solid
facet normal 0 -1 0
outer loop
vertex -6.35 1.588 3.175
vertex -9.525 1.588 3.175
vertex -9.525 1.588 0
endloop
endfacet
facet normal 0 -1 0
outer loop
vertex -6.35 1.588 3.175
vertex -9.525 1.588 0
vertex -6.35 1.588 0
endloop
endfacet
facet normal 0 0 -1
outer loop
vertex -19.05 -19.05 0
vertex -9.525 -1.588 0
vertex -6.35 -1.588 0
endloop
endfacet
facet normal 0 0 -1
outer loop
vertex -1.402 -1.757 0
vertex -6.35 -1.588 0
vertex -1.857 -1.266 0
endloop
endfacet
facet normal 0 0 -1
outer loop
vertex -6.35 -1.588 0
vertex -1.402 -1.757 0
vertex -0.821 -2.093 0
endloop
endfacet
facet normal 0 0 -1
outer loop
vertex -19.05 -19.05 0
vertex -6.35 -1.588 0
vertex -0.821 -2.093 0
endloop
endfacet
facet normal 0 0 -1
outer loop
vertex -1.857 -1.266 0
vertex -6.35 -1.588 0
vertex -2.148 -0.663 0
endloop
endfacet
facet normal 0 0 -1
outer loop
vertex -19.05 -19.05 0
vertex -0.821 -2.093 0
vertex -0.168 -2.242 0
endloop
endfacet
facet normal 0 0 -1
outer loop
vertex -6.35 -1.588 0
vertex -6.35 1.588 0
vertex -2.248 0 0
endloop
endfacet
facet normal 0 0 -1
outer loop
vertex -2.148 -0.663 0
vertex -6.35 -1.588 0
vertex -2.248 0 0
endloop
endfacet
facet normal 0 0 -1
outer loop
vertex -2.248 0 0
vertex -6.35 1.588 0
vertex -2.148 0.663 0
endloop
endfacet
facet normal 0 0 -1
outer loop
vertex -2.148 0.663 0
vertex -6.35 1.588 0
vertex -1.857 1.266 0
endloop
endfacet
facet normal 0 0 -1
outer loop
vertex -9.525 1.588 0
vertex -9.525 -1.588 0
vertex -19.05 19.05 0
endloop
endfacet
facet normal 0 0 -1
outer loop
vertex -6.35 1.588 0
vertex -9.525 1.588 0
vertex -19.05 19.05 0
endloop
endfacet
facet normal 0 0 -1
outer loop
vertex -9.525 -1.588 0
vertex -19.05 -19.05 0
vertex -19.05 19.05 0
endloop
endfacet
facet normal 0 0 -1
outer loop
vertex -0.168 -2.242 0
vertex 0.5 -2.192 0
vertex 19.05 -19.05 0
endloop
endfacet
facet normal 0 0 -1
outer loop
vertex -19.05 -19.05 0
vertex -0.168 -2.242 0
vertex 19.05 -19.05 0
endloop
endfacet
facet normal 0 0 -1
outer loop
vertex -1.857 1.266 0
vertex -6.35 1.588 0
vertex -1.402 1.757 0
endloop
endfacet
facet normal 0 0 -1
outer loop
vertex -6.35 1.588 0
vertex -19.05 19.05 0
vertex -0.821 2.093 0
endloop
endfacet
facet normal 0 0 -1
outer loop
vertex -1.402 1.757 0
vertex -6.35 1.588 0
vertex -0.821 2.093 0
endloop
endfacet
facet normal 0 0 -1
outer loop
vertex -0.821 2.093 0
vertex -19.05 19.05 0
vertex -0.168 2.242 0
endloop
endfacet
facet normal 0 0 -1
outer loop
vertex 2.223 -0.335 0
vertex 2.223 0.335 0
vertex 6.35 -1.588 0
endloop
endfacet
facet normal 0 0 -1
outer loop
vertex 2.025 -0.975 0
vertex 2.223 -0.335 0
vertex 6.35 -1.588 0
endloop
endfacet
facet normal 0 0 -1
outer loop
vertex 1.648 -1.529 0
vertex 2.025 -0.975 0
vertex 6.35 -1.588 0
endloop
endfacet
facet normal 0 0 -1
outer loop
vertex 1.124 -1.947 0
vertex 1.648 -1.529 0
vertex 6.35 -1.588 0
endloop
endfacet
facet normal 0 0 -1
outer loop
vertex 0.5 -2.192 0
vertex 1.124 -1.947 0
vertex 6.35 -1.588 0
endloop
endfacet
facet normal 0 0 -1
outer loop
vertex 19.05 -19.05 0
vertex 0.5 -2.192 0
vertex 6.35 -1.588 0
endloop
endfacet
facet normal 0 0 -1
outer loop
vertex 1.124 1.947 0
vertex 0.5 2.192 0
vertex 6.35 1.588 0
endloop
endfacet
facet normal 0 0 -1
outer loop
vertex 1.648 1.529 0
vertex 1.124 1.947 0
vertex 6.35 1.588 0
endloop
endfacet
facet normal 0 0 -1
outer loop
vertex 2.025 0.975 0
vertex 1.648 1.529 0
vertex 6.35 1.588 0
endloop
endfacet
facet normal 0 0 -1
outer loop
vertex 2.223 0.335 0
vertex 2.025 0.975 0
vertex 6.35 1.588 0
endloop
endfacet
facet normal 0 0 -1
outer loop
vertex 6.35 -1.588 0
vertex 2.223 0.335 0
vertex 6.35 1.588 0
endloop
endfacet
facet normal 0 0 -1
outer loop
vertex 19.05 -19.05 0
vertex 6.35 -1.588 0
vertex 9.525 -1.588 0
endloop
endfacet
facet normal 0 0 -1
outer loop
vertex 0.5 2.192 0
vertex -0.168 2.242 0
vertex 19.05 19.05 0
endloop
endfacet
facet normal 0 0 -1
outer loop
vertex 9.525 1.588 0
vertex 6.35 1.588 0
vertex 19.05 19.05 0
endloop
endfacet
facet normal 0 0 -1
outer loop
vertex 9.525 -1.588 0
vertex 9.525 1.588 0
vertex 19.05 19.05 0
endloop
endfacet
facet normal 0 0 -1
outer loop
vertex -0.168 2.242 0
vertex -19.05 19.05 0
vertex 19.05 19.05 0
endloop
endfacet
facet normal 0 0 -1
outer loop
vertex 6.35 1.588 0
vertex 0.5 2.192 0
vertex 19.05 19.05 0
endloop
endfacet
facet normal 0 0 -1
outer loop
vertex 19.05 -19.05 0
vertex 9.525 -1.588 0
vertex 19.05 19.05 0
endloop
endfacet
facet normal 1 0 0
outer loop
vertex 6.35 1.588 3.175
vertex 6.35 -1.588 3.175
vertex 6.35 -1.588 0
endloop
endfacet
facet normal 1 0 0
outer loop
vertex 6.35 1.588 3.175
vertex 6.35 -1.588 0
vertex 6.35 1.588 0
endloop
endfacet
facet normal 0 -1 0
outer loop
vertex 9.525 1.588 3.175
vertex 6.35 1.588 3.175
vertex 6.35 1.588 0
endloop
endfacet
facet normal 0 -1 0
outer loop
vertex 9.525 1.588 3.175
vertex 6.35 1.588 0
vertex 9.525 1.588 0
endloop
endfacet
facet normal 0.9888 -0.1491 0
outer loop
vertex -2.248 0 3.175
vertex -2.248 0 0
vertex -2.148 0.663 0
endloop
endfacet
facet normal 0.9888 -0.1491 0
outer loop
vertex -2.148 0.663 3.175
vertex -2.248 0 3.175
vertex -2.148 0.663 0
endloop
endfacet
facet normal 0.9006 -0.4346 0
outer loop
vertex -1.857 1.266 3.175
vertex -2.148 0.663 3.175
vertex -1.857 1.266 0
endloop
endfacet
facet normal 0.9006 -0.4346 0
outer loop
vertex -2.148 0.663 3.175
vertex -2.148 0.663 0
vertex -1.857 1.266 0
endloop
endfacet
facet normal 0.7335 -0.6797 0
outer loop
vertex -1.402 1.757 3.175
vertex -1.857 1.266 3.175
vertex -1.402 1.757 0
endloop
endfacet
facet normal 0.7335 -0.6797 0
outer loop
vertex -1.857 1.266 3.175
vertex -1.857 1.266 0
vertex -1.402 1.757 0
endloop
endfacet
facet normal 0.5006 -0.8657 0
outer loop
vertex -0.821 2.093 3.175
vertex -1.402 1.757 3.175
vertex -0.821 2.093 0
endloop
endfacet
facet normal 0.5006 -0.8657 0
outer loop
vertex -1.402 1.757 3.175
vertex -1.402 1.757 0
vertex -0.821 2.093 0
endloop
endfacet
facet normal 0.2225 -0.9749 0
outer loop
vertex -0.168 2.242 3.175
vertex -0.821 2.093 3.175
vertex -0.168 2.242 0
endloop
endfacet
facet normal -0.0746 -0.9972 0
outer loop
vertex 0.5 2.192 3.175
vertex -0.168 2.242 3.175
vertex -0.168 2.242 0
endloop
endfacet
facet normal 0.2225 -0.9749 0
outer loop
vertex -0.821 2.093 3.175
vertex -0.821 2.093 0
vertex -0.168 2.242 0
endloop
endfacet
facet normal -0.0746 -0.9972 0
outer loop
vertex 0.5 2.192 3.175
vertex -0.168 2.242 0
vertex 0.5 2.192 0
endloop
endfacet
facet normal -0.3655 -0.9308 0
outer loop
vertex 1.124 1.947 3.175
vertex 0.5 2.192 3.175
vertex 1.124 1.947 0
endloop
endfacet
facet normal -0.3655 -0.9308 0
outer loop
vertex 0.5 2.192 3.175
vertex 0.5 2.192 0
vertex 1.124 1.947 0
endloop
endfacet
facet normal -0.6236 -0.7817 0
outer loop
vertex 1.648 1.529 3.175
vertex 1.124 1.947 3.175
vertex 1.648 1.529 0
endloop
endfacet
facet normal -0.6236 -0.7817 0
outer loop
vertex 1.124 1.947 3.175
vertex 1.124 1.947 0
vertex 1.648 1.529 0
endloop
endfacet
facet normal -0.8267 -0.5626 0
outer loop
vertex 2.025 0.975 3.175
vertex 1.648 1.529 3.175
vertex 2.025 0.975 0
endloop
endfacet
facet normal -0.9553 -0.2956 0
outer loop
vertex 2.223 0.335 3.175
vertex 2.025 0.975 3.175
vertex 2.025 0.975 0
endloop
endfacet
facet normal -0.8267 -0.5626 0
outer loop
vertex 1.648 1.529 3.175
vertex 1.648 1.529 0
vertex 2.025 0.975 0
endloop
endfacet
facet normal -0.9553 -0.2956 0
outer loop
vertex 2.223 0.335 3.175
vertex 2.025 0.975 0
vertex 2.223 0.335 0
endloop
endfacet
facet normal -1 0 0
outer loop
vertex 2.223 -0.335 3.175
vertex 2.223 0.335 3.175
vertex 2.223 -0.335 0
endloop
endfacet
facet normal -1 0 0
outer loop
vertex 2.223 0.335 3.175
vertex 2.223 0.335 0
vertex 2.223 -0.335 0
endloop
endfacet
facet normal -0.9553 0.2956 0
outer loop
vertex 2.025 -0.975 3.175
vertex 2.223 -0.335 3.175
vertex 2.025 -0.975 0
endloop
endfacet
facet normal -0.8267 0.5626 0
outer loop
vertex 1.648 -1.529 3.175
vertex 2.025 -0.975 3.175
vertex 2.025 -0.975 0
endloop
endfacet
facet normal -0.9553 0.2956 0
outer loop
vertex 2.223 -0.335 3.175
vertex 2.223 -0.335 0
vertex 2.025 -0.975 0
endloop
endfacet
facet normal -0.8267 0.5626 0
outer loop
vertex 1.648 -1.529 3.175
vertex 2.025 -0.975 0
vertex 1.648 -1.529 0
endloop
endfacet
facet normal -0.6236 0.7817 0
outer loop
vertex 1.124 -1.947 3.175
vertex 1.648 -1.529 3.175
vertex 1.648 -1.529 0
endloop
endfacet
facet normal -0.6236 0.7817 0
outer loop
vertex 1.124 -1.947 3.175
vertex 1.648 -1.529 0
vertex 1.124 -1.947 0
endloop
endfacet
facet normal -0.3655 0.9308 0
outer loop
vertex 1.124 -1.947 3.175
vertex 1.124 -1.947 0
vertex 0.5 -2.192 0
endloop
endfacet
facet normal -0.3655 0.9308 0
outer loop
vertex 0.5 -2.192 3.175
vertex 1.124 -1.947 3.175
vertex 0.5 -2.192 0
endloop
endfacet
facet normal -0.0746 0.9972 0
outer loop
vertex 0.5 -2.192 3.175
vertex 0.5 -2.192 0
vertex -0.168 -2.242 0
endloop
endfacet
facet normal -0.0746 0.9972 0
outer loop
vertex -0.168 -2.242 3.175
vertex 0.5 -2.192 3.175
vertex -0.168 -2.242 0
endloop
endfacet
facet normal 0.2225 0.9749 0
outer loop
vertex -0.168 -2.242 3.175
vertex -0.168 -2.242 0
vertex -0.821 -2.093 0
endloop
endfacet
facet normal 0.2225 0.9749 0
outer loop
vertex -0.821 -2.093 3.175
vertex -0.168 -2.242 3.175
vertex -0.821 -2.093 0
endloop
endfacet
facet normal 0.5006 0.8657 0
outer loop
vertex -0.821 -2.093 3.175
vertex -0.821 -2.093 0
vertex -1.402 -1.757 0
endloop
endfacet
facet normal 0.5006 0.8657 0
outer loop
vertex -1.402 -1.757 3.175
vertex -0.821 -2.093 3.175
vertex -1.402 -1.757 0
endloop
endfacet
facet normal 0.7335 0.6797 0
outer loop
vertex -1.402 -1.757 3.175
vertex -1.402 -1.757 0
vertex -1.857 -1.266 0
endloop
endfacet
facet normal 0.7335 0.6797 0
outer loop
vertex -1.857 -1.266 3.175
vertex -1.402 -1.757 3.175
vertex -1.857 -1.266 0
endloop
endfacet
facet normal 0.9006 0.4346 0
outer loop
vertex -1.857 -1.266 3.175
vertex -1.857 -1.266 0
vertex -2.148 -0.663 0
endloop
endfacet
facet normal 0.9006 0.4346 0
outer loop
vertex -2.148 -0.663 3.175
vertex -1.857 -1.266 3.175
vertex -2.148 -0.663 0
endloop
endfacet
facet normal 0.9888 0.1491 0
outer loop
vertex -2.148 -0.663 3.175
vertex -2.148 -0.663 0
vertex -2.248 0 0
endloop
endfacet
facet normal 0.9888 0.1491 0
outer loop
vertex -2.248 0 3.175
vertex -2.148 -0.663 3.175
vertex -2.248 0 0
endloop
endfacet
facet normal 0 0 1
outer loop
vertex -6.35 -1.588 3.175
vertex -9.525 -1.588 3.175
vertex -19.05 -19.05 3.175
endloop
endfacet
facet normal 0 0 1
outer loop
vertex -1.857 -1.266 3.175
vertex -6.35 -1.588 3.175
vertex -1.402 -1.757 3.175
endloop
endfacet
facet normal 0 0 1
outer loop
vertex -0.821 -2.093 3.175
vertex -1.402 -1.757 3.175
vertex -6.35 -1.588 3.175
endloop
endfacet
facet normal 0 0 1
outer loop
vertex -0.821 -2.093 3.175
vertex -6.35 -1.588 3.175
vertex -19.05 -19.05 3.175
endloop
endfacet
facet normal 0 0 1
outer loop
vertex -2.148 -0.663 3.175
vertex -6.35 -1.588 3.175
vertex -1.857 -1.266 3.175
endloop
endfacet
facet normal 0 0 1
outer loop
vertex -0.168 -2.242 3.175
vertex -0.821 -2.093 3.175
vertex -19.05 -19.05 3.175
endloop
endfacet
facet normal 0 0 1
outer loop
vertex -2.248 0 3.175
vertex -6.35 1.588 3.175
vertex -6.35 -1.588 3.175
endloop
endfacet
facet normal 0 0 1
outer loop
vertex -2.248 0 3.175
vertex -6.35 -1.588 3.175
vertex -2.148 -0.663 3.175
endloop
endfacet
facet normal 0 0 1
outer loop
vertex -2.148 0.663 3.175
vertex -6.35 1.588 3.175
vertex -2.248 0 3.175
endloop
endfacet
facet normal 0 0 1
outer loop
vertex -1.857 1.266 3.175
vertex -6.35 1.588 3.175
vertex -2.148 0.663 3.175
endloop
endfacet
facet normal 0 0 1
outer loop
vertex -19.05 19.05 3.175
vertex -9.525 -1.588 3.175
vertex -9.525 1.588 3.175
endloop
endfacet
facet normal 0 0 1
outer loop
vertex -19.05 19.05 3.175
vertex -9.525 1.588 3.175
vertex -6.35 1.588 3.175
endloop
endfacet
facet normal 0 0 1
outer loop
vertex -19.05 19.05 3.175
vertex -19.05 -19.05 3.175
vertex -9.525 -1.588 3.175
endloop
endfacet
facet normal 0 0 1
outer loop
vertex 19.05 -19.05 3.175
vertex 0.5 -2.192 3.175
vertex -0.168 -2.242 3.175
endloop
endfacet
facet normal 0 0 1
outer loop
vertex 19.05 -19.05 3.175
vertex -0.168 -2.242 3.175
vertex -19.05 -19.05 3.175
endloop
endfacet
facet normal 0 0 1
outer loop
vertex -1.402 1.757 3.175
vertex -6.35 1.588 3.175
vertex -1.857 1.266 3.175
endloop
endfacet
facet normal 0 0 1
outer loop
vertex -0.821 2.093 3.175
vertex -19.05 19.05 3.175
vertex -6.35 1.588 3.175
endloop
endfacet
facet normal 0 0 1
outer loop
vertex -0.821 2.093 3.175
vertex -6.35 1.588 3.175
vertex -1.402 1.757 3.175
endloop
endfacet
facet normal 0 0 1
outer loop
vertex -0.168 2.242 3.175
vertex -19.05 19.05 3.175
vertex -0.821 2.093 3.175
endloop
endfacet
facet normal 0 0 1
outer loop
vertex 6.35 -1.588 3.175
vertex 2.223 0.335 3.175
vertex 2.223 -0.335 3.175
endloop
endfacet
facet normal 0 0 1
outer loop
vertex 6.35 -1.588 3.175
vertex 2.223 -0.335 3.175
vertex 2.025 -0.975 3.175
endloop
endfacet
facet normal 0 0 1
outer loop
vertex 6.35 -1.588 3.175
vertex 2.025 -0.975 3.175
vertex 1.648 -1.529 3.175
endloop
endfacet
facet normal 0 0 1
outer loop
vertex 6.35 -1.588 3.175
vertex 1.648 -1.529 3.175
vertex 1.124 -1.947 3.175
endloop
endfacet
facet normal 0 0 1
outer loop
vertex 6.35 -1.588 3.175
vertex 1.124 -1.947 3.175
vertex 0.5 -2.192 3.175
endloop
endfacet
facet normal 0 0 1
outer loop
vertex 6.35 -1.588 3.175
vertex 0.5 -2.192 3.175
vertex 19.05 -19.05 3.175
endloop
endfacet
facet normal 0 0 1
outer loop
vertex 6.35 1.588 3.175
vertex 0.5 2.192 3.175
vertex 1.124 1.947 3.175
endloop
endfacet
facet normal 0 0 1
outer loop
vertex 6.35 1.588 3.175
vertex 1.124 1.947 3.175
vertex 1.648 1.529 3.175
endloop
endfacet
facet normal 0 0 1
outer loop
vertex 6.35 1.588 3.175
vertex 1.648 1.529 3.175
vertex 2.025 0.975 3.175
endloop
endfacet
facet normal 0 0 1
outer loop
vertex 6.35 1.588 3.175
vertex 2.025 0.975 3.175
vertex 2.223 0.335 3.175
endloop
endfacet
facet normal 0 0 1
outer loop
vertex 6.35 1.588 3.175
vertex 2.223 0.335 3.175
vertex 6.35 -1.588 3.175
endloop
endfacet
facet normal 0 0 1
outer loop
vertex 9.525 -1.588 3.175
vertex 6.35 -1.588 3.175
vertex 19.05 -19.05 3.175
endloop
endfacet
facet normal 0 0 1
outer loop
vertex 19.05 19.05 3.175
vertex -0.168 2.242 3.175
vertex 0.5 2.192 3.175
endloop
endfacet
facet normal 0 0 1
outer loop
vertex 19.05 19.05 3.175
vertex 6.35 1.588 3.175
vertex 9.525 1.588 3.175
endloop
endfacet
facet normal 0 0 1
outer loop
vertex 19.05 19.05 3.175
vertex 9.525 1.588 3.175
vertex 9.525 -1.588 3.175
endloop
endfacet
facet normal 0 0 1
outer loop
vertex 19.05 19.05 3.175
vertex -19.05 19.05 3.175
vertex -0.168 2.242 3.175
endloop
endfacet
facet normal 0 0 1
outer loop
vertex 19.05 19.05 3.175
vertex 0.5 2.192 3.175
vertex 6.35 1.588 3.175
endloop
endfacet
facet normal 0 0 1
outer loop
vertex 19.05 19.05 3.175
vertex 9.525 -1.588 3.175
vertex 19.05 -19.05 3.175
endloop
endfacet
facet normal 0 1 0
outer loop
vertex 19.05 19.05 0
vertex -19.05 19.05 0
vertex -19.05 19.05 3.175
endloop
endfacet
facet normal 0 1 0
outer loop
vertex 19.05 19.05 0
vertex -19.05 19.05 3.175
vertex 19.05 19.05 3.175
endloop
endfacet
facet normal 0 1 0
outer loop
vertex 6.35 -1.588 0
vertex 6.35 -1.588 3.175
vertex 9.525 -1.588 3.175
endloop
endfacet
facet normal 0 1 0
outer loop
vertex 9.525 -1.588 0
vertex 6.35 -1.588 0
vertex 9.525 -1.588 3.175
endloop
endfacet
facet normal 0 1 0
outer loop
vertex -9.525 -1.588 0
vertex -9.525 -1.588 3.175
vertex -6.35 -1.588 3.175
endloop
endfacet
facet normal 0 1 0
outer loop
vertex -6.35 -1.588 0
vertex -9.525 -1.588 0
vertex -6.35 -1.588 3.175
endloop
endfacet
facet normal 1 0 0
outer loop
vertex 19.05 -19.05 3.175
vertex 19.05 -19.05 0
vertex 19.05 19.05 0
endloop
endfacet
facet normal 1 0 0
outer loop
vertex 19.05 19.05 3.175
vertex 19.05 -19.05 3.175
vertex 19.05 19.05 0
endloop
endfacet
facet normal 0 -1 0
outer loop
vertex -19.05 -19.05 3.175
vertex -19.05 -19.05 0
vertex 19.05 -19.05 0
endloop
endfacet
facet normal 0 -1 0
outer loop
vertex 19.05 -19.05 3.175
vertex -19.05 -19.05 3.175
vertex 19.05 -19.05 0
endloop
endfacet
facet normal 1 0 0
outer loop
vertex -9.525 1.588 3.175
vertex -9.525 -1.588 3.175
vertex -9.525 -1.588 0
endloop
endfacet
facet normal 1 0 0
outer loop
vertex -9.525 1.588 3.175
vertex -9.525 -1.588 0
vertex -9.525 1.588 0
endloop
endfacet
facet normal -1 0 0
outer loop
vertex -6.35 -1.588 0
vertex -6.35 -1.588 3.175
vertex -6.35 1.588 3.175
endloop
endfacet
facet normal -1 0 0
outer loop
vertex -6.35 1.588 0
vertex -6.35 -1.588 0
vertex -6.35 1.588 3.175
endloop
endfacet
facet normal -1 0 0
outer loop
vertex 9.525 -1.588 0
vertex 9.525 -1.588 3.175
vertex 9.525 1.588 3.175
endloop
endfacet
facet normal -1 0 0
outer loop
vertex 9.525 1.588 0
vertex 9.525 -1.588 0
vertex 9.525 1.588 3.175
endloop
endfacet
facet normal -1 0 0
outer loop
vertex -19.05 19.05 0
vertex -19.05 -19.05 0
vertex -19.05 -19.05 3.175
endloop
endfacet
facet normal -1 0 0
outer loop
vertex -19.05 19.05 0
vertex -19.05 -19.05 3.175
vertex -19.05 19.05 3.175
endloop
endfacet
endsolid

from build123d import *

# Parameters (mm, degrees)
SKETCH1_W                 = 38.1
SKETCH1_H                 = 38.1
BOSS_EXTRUDE1_DEPTH       = 3.175
F_8_CLEARANCE_HOLE1_D     = 4.4958
F_8_CLEARANCE_HOLE1_DEPTH = 10.16
F_8_CLEARANCE_HOLE1_TIP   = 1.350674586
SKETCH4_W                 = 3.175
SKETCH4_H                 = 3.175
CUT_EXTRUDE1_DEPTH        = 3.175


with BuildPart() as part:
    # Sketch1 → Boss-Extrude1 (new body)
    with BuildSketch(Plane.XY):
        Rectangle(SKETCH1_W, SKETCH1_H)
    extrude(amount=BOSS_EXTRUDE1_DEPTH)

    # #8 Clearance Hole1
    with Locations(Plane.XY.offset(3.175)):
        with Locations((0, 0)):
            Hole(F_8_CLEARANCE_HOLE1_D / 2, depth=F_8_CLEARANCE_HOLE1_DEPTH)
            with Locations((0, 0, -(F_8_CLEARANCE_HOLE1_DEPTH + F_8_CLEARANCE_HOLE1_TIP / 2))):  # 118° drill point
                Cone(0, F_8_CLEARANCE_HOLE1_D / 2, F_8_CLEARANCE_HOLE1_TIP, mode=Mode.SUBTRACT)

    # Sketch4 → Cut-Extrude1 (cut)
    with BuildSketch(Plane.XY.offset(3.175)):
        with Locations((-7.9375, 0)):
            Rectangle(SKETCH4_W, SKETCH4_H)
        with Locations((7.9375, 0)):
            Rectangle(SKETCH4_W, SKETCH4_H)
    extrude(amount=-CUT_EXTRUDE1_DEPTH, mode=Mode.SUBTRACT)


solid = part.part
